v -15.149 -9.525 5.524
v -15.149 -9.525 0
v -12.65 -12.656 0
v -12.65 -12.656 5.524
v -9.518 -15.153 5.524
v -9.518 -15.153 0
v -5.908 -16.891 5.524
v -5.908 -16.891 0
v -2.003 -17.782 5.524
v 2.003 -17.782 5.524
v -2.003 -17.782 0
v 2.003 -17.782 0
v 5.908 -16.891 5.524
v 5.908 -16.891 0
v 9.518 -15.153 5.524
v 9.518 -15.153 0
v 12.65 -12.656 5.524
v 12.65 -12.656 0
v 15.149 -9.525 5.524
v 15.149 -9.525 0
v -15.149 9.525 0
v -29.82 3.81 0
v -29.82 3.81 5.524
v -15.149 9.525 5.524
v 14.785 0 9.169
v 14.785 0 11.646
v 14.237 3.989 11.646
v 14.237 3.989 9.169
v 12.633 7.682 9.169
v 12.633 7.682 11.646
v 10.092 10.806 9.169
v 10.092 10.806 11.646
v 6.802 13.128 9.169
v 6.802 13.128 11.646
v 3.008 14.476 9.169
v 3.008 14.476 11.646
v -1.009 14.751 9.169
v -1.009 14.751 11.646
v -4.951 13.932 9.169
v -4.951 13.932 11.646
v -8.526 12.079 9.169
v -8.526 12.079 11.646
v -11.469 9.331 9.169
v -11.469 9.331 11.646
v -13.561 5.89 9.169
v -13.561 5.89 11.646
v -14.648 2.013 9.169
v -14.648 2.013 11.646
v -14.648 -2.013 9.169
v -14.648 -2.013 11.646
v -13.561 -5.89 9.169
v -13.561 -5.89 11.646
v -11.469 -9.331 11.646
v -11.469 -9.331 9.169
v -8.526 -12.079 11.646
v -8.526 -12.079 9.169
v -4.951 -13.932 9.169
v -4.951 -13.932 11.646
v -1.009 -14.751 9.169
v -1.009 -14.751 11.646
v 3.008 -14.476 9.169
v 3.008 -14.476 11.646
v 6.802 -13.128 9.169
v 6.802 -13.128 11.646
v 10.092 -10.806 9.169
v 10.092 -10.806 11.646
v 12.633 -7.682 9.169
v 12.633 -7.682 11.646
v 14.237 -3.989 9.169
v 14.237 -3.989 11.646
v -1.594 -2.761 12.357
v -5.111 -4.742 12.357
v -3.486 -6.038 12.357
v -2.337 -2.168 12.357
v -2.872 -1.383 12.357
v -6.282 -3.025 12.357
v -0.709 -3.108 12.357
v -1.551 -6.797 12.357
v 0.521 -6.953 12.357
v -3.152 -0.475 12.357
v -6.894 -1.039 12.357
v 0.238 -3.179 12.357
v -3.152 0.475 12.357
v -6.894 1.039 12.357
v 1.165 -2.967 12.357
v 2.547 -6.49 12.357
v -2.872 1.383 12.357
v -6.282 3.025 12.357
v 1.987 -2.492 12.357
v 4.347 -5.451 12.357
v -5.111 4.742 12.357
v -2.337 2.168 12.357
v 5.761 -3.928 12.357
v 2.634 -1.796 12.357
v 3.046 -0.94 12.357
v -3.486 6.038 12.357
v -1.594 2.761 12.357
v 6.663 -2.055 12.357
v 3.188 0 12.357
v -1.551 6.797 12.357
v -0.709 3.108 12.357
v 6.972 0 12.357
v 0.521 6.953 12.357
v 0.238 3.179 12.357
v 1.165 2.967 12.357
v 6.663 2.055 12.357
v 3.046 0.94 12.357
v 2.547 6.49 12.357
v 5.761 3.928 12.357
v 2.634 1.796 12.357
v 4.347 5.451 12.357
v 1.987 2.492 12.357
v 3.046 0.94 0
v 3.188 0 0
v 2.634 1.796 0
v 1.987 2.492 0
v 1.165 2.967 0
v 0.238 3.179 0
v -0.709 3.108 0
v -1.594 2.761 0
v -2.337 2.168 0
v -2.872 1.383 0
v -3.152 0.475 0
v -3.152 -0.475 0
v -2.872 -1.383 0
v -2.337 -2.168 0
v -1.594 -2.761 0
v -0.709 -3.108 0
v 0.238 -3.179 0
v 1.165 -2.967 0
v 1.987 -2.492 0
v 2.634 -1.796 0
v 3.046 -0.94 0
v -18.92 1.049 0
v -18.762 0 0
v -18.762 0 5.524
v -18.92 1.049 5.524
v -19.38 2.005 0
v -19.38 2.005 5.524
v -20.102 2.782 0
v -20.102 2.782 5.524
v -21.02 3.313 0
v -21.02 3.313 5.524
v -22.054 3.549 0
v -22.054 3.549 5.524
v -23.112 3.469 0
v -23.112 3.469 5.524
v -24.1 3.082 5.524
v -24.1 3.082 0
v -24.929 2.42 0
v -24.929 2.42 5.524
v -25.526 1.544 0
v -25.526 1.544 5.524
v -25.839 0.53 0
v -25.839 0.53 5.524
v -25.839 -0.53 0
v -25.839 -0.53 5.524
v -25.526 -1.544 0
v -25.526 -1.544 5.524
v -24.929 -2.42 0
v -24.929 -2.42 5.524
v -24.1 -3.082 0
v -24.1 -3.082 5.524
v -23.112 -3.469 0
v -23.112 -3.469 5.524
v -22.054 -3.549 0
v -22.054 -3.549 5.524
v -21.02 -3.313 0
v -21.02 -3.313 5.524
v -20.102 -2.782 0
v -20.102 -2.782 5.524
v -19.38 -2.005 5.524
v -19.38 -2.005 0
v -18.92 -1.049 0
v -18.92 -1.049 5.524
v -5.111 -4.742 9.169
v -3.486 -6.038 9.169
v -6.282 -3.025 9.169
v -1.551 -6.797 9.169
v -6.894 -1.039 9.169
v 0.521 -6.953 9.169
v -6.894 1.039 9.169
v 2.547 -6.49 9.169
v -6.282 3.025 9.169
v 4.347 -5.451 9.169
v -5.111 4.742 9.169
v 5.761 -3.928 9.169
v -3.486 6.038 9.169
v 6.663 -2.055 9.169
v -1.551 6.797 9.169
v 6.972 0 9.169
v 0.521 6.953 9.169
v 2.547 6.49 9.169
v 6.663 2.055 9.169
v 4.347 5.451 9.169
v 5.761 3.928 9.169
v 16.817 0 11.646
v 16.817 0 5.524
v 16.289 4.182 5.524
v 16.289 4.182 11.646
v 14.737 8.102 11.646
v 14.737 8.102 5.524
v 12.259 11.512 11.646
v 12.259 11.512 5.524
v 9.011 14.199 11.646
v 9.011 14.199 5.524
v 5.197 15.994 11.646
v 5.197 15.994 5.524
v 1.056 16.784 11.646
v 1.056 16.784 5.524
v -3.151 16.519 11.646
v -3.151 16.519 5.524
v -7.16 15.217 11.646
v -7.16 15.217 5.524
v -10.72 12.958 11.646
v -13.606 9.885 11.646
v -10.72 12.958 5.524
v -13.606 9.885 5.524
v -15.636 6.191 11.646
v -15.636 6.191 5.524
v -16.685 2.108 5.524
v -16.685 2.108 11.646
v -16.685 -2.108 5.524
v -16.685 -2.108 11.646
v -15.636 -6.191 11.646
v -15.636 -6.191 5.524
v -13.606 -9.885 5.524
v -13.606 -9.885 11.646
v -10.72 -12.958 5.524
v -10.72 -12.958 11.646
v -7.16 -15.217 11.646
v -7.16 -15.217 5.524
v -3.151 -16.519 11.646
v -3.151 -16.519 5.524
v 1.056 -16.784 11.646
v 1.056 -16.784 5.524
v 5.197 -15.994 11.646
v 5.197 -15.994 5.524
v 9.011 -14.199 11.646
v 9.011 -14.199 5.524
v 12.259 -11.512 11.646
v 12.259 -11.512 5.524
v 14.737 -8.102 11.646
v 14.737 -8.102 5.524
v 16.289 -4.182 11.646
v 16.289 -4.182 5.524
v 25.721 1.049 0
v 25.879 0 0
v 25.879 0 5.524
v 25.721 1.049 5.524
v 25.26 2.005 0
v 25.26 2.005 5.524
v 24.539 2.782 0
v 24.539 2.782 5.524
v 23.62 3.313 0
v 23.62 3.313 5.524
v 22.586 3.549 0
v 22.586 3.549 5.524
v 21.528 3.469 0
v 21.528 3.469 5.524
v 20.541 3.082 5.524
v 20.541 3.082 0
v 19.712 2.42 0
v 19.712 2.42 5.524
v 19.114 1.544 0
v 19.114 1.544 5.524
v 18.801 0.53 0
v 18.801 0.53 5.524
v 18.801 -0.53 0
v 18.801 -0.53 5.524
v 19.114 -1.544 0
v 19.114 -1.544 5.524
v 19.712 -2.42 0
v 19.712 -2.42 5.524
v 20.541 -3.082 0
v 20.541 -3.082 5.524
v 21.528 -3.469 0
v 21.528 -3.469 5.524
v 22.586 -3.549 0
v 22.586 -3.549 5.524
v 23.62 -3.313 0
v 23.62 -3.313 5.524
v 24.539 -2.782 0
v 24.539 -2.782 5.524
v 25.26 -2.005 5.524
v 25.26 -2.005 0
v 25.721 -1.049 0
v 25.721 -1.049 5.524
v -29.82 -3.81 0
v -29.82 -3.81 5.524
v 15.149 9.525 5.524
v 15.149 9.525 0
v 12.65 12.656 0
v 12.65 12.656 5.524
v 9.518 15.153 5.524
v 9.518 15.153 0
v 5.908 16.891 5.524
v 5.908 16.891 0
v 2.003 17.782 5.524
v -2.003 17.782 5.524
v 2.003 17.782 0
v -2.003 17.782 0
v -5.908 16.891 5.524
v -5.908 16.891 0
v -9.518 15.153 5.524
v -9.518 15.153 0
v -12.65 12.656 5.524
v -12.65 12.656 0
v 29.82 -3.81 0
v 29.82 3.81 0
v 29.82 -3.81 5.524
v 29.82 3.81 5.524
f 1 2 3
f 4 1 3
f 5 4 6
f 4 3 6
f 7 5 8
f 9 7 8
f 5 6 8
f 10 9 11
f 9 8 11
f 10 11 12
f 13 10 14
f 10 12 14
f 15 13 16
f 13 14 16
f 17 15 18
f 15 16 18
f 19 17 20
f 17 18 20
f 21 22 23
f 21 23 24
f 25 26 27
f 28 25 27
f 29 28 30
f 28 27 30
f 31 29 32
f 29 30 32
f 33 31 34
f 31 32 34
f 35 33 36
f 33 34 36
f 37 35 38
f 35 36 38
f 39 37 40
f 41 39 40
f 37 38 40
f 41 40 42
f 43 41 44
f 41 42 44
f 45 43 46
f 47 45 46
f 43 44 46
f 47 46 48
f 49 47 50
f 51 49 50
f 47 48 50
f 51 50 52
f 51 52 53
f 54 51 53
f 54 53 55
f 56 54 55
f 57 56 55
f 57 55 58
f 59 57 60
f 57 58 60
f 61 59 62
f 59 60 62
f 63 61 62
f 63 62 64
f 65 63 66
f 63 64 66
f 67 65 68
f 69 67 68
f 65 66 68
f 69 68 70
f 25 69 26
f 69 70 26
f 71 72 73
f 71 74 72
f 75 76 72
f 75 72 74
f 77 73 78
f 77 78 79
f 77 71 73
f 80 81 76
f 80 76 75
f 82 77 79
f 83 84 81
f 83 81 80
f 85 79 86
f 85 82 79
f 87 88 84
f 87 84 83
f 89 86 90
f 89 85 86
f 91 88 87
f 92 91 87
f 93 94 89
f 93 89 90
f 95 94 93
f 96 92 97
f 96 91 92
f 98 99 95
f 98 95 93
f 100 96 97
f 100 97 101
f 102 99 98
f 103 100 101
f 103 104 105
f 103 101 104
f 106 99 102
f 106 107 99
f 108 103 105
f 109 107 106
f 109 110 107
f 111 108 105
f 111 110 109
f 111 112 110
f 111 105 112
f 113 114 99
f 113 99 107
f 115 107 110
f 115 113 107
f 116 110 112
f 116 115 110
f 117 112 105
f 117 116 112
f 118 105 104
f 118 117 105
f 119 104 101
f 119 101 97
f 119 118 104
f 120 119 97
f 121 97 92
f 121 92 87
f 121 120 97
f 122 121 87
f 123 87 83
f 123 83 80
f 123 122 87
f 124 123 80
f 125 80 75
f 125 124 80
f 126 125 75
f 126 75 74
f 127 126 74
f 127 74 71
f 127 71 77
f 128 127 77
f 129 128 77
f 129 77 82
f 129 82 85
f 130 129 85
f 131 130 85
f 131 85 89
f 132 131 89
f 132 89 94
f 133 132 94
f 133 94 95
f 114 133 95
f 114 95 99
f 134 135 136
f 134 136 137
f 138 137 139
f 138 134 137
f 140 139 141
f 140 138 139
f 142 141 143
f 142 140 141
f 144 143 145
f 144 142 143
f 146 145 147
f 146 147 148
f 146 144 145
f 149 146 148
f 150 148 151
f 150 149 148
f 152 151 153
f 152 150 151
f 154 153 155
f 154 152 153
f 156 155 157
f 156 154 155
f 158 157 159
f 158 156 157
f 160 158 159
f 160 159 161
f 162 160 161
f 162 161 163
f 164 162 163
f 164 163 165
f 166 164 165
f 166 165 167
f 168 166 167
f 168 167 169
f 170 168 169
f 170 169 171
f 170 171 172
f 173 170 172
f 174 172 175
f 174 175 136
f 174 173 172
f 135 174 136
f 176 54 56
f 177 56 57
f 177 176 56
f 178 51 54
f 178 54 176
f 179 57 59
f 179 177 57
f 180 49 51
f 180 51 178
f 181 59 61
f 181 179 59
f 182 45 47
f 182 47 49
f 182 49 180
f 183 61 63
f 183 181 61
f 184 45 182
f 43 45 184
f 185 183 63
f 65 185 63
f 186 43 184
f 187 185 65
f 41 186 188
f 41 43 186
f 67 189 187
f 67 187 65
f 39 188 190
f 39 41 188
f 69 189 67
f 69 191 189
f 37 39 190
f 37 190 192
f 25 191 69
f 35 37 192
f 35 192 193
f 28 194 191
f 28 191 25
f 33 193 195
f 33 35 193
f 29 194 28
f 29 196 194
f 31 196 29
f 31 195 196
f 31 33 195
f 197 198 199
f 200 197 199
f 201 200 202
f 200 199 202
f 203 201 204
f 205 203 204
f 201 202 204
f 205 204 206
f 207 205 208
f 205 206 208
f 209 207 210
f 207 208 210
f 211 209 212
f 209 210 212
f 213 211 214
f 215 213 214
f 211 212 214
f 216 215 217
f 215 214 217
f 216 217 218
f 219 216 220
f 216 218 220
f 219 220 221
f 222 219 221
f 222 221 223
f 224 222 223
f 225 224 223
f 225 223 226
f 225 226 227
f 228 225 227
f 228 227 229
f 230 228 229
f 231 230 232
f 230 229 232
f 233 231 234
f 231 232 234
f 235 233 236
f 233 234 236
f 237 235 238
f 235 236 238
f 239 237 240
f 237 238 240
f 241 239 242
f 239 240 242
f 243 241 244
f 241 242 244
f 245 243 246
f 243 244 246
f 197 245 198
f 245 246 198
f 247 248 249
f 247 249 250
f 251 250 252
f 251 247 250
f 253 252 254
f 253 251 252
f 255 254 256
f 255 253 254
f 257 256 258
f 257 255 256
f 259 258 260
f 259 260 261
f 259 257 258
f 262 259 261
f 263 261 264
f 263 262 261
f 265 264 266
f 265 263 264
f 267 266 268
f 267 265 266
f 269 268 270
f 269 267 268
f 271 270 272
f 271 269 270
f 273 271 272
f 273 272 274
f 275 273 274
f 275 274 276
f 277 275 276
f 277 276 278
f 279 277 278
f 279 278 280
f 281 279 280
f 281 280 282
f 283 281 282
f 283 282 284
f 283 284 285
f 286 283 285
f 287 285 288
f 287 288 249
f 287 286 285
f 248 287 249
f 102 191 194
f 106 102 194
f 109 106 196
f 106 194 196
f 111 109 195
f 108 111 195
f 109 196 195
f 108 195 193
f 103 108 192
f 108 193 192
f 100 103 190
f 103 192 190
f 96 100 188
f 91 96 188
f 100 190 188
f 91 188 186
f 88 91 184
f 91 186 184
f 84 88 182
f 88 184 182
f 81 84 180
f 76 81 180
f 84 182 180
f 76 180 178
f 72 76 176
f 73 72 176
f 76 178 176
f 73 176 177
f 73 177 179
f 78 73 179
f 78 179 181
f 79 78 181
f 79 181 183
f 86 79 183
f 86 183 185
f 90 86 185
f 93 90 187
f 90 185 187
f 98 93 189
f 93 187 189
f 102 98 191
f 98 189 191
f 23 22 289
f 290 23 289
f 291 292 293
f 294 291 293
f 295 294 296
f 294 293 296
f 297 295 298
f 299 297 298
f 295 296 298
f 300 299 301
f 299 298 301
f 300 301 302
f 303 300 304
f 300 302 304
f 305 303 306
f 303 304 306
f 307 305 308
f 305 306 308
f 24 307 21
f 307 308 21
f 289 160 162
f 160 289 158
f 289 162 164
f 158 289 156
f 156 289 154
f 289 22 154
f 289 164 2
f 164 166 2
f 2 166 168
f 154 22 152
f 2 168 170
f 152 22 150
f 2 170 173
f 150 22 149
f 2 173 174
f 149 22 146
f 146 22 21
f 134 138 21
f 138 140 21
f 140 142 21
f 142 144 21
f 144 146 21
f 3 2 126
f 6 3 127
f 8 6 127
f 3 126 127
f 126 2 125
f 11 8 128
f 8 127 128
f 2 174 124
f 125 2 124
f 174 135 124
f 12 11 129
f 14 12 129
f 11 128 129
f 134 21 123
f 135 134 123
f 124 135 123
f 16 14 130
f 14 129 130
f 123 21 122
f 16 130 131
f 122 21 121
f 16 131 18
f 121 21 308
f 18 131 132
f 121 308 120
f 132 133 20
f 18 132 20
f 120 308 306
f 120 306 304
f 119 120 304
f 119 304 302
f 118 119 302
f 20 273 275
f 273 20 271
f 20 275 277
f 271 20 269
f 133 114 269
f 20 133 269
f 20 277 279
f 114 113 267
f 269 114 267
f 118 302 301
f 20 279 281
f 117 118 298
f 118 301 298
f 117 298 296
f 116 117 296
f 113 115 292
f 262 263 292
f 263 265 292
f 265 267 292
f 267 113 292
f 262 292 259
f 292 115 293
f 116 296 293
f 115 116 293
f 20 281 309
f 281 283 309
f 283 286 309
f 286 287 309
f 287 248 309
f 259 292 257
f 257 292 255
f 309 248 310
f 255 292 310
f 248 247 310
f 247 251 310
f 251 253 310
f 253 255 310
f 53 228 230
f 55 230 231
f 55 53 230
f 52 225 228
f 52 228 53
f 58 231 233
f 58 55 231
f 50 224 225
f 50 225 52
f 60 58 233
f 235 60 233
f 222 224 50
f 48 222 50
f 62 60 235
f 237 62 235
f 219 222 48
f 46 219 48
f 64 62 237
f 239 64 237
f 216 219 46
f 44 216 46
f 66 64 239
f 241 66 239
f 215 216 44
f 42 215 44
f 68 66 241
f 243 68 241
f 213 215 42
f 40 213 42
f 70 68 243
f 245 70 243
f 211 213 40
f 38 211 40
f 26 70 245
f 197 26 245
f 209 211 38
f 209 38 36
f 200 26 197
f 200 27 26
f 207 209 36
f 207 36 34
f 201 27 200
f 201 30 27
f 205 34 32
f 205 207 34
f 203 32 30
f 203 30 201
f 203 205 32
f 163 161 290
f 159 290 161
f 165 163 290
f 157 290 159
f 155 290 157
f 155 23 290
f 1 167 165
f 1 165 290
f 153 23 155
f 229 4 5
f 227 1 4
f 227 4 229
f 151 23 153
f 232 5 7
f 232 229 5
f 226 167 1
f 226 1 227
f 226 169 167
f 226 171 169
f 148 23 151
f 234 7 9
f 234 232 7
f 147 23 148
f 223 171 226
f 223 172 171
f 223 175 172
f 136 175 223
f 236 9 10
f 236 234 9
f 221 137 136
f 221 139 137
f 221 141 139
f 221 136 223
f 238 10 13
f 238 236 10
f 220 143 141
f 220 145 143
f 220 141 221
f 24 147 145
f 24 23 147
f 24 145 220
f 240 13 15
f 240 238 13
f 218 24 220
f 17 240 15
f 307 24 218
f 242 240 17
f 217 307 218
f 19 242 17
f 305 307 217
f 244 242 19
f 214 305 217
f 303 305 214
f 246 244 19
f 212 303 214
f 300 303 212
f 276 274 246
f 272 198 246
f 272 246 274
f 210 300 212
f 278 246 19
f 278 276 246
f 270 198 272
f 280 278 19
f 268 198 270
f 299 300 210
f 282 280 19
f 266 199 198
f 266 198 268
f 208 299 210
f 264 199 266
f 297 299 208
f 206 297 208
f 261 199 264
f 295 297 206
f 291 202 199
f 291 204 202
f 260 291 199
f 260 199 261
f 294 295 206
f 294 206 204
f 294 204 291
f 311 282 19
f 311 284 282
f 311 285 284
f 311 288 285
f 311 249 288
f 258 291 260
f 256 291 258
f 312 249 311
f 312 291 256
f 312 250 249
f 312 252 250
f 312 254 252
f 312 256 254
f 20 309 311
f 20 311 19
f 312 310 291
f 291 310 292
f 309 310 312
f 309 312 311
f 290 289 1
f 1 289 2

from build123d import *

# Parameters (mm, degrees)
SKETCH_R        = 3.55854
SKETCH_R_2      = 3.1877
PAD_DEPTH       = 5.5245
SKETCH001_R     = 16.81734
PAD001_DEPTH    = 6.1214
SKETCH002_R     = 14.78534
POCKET_DEPTH    = 2.4765
SKETCH003_R     = 6.9723
PAD002_DEPTH    = 3.1877
SKETCH004_R     = 3.1877
POCKET001_DEPTH = 12.3581


with BuildPart() as part:
    # Sketch → Pad (new body)
    with BuildSketch(Plane.XY):
        with BuildLine():
            ThreePointArc((-15.148609, -9.525), (0, -17.8943), (15.148609, -9.525))
            Line((29.8196, -3.81), (15.148609, -9.525))
            Line((29.8196, 3.81), (29.8196, -3.81))
            Line((29.8196, 3.81), (15.148609, 9.525))
            ThreePointArc((15.148609, 9.525), (0, 17.8943), (-15.148609, 9.525))
            Line((-29.8196, 3.81), (-15.148609, 9.525))
            Line((-29.8196, 3.81), (-29.8196, -3.81))
            Line((-29.8196, -3.81), (-15.148609, -9.525))
        make_face()
        with Locations((22.32025, 0)):
            Circle(SKETCH_R, mode=Mode.SUBTRACT)
        with Locations((-22.32025, 0)):
            Circle(SKETCH_R, mode=Mode.SUBTRACT)
        Circle(SKETCH_R_2, mode=Mode.SUBTRACT)
    extrude(amount=PAD_DEPTH)

    # Sketch001 → Pad001 (new body)
    with BuildSketch(Plane.XY.offset(5.5245)):
        Circle(SKETCH001_R)
    extrude(amount=PAD001_DEPTH)

    # Sketch002 → Pocket (cut)
    with BuildSketch(Plane.XY.offset(11.6459)):
        Circle(SKETCH002_R)
    extrude(amount=-POCKET_DEPTH, mode=Mode.SUBTRACT)

    # Sketch003 → Pad002 (new body)
    with BuildSketch(Plane.XY.offset(9.1694)):
        Circle(SKETCH003_R)
    extrude(amount=PAD002_DEPTH)

    # Sketch004 → Pocket001 (cut, through all)
    with BuildSketch(Plane.XY.offset(12.3571)):
        Circle(SKETCH004_R)
    extrude(amount=-POCKET001_DEPTH, mode=Mode.SUBTRACT)


solid = part.part
